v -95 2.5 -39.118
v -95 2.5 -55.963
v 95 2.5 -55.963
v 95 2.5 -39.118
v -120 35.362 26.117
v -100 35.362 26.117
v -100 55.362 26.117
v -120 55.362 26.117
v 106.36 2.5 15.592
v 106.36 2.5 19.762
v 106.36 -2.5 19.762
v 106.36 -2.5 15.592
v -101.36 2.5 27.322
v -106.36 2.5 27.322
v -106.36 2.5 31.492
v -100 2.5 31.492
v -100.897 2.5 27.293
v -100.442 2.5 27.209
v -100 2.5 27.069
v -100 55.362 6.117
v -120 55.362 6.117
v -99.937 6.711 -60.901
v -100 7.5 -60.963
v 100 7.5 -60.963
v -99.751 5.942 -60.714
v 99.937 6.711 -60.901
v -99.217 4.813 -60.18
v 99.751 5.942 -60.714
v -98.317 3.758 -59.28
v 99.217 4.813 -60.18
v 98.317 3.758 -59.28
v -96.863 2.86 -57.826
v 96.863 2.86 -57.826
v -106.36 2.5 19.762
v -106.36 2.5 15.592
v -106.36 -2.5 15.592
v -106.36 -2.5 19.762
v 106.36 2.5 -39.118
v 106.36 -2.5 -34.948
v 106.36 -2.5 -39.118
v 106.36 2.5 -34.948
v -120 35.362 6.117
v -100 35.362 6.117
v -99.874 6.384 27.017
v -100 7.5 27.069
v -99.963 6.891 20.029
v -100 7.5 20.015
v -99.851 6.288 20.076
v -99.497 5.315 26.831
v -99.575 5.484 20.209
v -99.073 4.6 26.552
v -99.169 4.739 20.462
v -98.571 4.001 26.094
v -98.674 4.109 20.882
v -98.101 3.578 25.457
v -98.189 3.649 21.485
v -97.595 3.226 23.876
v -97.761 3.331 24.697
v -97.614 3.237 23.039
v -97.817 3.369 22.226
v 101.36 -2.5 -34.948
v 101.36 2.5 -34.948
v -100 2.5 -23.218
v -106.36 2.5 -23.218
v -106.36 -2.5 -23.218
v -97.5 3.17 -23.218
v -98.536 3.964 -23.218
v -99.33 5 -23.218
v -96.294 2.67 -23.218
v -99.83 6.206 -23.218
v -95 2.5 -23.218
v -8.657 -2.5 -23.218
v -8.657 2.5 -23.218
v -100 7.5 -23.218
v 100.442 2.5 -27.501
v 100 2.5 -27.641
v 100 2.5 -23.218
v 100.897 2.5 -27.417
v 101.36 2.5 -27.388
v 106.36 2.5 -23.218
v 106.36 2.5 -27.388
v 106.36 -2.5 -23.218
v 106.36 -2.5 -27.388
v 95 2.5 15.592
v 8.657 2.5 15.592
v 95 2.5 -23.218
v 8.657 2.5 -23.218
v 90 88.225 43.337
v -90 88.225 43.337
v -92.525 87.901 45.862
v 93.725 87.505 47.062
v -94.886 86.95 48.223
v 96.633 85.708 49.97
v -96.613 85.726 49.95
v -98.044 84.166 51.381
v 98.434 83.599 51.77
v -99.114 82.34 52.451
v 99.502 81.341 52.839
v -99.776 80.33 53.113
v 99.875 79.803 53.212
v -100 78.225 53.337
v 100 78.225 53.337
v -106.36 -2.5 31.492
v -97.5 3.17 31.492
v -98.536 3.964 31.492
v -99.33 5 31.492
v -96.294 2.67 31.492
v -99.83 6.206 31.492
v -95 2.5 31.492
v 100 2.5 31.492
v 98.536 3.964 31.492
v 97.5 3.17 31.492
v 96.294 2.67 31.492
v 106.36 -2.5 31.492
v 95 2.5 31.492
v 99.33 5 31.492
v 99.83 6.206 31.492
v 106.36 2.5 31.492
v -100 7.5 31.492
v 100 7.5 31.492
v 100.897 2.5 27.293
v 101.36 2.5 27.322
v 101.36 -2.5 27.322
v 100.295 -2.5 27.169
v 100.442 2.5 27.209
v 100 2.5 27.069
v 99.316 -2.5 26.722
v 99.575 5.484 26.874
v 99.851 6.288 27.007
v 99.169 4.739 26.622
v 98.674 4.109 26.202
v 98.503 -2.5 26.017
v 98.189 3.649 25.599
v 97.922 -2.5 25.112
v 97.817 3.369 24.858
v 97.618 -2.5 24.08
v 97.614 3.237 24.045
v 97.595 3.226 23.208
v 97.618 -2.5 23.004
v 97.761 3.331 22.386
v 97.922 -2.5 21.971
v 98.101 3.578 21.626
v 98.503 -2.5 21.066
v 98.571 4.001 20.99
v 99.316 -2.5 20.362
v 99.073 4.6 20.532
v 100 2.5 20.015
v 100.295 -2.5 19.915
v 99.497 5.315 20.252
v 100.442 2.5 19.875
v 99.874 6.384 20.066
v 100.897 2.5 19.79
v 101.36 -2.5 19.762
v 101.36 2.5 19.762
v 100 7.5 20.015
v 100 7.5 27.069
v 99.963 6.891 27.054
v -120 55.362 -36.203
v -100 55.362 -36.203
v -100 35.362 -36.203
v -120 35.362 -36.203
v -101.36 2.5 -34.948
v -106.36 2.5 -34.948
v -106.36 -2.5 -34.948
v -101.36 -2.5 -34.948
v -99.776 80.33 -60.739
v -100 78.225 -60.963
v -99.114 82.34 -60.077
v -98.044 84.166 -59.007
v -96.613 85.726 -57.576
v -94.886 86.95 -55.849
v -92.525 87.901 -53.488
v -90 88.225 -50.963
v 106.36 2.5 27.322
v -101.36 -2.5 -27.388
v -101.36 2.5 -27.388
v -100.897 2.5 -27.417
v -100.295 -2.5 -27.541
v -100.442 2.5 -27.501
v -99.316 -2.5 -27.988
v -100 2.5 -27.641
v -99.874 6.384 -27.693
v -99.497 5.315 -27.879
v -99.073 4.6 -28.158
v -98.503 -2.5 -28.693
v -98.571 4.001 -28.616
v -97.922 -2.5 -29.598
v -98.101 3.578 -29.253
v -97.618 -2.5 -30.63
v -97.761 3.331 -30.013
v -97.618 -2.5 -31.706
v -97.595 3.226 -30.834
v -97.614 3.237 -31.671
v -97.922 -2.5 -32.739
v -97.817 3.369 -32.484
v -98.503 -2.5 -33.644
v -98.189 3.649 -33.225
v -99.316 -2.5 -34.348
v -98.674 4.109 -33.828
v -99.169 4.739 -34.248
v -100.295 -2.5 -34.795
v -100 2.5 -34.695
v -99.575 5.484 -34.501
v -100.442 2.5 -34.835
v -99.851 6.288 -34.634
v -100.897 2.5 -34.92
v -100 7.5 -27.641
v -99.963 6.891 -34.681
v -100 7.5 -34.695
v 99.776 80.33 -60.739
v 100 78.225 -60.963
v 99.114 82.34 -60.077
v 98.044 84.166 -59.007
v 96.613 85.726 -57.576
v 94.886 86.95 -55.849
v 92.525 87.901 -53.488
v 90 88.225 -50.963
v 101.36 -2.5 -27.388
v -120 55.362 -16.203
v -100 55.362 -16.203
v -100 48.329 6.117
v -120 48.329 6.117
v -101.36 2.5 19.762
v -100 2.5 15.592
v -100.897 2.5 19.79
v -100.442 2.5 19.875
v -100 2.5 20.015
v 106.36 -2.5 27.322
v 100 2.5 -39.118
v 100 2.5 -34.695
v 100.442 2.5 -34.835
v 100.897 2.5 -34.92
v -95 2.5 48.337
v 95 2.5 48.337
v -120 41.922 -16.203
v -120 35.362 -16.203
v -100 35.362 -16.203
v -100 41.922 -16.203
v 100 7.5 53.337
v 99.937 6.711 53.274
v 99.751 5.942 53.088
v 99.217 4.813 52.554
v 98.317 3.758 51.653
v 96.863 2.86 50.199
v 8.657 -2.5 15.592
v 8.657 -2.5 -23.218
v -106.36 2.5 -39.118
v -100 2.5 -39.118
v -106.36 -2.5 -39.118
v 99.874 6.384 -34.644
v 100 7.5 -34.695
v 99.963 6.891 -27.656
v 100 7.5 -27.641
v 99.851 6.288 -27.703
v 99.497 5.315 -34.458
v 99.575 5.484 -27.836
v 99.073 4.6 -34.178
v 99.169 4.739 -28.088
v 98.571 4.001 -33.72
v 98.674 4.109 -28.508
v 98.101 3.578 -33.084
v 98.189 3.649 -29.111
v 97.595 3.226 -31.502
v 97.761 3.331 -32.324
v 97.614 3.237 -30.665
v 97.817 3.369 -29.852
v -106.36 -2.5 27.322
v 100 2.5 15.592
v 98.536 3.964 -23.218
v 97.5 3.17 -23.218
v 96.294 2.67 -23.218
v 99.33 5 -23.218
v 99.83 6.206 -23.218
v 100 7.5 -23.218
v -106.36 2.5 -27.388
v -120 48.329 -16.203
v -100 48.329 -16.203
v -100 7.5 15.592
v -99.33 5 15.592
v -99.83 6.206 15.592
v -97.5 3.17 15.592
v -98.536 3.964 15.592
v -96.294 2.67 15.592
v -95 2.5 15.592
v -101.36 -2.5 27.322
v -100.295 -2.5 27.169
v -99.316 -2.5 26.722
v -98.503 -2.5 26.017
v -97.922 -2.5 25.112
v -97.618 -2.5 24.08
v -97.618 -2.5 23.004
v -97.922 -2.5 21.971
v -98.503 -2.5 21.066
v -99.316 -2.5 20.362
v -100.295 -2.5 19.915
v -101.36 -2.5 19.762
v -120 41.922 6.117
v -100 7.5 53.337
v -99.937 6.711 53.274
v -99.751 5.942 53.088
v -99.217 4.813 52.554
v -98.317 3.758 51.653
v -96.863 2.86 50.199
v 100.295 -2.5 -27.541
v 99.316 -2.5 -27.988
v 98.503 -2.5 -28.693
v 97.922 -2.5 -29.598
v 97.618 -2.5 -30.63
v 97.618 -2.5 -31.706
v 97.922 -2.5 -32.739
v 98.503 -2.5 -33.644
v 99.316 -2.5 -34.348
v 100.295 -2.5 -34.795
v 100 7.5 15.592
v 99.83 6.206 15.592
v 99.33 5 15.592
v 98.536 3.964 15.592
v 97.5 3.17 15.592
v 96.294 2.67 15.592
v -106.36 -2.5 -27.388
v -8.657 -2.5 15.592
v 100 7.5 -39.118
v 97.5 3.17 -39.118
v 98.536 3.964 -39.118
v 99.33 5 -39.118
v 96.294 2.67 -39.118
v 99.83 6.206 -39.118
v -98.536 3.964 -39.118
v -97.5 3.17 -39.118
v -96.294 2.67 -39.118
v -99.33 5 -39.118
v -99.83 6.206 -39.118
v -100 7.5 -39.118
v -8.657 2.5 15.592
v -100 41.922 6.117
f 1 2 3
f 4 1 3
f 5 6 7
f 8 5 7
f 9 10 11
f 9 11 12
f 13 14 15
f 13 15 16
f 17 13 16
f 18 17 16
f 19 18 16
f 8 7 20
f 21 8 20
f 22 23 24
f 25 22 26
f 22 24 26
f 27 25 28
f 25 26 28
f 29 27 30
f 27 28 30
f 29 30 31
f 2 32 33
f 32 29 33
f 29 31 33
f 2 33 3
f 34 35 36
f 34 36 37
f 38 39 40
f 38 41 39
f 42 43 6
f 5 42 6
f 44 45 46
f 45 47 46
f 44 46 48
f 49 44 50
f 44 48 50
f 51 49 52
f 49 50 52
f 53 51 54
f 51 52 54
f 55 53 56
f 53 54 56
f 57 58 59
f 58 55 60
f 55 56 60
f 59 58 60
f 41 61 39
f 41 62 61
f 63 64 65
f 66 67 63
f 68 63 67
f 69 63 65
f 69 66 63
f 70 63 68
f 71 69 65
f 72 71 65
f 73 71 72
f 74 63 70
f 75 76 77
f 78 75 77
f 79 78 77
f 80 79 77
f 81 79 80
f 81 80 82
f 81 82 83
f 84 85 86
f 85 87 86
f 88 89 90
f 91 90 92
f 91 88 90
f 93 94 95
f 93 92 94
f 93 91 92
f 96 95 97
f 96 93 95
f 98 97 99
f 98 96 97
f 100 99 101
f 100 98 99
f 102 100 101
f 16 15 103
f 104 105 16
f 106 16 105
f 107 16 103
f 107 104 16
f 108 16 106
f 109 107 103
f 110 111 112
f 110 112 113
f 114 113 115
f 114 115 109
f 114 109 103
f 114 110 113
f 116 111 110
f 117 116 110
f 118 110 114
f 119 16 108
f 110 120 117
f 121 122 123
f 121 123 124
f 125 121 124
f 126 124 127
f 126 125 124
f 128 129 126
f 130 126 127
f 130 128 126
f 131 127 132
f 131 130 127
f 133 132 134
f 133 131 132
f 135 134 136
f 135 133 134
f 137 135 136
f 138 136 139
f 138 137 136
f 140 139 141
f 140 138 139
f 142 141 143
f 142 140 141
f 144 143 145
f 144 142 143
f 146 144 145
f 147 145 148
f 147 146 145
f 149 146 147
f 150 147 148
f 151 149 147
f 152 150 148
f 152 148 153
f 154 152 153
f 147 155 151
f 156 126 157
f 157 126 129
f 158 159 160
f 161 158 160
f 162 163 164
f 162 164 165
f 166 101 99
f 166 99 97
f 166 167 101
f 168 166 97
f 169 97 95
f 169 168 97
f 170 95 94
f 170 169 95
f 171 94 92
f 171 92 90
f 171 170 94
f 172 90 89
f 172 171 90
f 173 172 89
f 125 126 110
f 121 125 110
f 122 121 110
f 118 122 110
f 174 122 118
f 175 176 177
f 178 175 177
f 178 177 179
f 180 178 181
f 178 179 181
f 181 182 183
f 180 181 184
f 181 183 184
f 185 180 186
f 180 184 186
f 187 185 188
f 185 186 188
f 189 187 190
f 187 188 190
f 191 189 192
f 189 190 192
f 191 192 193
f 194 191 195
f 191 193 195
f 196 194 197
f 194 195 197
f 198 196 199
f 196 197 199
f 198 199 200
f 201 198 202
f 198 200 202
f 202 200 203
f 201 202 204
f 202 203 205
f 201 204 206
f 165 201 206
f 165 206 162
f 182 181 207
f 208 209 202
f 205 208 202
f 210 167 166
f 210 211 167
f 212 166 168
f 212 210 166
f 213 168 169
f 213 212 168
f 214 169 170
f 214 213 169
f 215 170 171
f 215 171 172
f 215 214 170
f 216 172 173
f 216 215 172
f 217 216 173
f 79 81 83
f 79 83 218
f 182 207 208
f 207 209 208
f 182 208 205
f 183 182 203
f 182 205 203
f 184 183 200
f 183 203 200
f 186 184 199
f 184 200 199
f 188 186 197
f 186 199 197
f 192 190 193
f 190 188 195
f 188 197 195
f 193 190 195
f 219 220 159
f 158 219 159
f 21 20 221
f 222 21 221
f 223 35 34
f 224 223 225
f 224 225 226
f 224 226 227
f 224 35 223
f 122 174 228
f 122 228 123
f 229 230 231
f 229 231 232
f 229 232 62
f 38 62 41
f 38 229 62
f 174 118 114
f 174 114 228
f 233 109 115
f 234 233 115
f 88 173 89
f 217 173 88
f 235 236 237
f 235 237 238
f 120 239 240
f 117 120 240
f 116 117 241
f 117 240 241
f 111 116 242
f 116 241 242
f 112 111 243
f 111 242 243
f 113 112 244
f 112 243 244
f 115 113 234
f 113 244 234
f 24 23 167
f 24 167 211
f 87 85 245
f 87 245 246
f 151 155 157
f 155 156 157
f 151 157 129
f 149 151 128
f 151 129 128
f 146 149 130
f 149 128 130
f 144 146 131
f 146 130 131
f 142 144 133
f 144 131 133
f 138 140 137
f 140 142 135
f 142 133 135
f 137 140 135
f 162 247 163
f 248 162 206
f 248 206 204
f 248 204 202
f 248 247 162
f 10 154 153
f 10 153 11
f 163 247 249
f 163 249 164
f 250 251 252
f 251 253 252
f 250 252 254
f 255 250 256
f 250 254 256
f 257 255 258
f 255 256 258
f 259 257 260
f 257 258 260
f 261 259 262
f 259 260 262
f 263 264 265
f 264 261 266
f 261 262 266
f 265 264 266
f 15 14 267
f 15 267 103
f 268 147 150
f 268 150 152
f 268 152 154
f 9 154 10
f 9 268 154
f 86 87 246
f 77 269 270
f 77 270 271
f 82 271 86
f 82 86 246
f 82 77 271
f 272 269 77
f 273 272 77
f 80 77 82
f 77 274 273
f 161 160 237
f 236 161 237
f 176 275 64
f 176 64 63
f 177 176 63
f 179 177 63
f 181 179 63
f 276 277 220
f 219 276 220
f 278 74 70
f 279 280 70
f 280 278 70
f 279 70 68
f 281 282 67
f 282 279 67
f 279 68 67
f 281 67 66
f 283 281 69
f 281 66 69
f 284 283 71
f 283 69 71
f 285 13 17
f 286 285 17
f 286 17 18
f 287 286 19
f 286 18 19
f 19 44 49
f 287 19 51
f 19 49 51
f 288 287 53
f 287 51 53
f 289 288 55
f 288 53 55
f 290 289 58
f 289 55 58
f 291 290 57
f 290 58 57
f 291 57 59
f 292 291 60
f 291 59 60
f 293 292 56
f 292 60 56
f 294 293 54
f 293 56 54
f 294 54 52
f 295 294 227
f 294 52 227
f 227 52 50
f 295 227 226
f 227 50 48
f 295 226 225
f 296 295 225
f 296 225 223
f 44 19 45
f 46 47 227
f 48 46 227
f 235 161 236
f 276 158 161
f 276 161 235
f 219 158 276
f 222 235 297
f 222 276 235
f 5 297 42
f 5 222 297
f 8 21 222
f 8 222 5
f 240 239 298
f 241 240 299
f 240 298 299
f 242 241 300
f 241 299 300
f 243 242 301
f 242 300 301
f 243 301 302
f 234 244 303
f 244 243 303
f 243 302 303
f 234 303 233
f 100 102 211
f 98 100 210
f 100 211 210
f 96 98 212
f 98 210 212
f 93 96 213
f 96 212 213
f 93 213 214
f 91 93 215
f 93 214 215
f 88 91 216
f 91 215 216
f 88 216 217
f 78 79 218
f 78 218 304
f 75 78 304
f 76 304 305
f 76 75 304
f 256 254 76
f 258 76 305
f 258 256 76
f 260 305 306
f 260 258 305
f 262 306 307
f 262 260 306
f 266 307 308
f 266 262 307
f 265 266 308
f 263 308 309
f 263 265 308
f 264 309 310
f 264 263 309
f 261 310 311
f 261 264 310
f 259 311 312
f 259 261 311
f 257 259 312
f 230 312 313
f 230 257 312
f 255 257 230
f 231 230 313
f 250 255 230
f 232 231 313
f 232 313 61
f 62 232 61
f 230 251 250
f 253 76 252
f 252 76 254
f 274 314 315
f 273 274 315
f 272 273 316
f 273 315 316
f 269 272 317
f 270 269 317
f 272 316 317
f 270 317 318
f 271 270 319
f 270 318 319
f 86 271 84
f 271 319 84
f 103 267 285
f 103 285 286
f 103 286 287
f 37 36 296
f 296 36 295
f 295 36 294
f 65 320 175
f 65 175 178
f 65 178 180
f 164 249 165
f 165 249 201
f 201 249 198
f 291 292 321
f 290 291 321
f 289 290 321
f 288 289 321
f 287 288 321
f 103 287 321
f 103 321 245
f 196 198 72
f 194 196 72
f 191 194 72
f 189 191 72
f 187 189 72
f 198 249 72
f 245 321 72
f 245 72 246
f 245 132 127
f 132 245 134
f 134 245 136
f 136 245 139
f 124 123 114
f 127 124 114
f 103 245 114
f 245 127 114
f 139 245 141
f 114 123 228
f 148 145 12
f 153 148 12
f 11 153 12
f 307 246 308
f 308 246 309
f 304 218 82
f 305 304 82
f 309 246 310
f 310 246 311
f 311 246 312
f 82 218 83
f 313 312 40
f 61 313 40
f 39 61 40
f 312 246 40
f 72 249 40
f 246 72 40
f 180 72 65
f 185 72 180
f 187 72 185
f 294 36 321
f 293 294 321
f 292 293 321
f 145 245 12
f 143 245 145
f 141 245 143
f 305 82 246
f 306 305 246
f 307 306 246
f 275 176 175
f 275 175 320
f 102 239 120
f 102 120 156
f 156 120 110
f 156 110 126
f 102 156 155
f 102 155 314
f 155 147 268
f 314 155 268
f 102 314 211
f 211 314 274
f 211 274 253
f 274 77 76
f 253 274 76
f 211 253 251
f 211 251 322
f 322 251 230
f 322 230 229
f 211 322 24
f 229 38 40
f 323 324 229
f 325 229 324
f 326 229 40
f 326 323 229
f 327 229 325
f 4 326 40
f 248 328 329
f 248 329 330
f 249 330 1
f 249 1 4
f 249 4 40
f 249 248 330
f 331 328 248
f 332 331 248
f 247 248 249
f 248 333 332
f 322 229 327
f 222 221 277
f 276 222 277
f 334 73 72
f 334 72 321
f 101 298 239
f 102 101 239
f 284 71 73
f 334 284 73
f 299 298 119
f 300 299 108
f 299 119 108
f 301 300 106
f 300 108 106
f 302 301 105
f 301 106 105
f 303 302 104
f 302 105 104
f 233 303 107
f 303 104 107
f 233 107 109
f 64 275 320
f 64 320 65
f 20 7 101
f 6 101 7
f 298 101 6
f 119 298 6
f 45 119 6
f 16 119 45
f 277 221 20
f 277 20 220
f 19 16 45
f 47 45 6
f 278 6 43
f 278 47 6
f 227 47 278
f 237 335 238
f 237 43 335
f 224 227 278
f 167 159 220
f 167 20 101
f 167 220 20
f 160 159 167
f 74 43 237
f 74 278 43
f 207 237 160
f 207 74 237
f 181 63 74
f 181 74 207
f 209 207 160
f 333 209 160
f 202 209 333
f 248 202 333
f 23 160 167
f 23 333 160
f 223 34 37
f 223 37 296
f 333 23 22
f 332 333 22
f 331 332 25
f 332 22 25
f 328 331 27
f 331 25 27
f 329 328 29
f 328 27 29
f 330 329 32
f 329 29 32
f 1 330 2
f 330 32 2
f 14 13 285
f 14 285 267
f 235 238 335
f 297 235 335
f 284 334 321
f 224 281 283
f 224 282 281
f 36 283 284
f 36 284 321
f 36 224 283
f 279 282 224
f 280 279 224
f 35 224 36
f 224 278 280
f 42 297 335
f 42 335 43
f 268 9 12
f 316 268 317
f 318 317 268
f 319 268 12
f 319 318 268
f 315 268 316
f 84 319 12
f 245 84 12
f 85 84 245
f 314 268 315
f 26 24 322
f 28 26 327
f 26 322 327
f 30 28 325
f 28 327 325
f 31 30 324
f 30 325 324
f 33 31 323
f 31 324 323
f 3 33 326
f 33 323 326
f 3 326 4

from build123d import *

# Parameters (mm, degrees)
BOSS_EXTRUDE1_DEPTH = 2.5
SKETCH2_W           = 200
SKETCH2_H           = 114.3
BOSS_EXTRUDE3_DEPTH = 85.725
BOSS_EXTRUDE5_DEPTH = 20
FILLET1_R           = 5
FILLET2_R           = 10


with BuildPart() as part:
    # Sketch1 → Boss-Extrude1 (new, symmetric)
    with BuildSketch(Plane(origin=(0, 0, 0), x_dir=(1, 0, 0), z_dir=(0, 1, 0))):
        with BuildLine():
            Line((106.36, 39.118252024), (-106.36, 39.118252024))
            Line((-106.36, 39.118252024), (-106.36, 34.948252024))
            Line((-106.36, 34.948252024), (-101.36, 34.948252024))
            ThreePointArc((-101.36, 34.948252024), (-97.58, 31.168252024), (-101.36, 27.388252024))
            Line((-101.36, 27.388252024), (-106.36, 27.388252024))
            Line((-106.36, 27.388252024), (-106.36, 23.218252024))
            Line((-106.36, 23.218252024), (-8.657269076, 23.218252024))
            Line((-8.657269076, 23.218252024), (-8.657269076, -15.591747976))
            Line((-8.657269076, -15.591747976), (-106.36, -15.591747976))
            Line((-106.36, -15.591747976), (-106.36, -19.761747976))
            Line((-106.36, -19.761747976), (-101.36, -19.761747976))
            ThreePointArc((-101.36, -19.761747976), (-97.58, -23.541747976), (-101.36, -27.321747976))
            Line((-101.36, -27.321747976), (-106.36, -27.321747976))
            Line((-106.36, -27.321747976), (-106.36, -31.491747976))
            Line((-106.36, -31.491747976), (106.36, -31.491747976))
            Line((106.36, -31.491747976), (106.36, -27.321747976))
            Line((106.36, -27.321747976), (101.36, -27.321747976))
            ThreePointArc((101.36, -27.321747976), (97.58, -23.541747976), (101.36, -19.761747976))
            Line((101.36, -19.761747976), (106.36, -19.761747976))
            Line((106.36, -19.761747976), (106.36, -15.591747976))
            Line((106.36, -15.591747976), (8.657269076, -15.591747976))
            Line((8.657269076, -15.591747976), (8.657269076, 23.218252024))
            Line((8.657269076, 23.218252024), (106.36, 23.218252024))
            Line((106.36, 23.218252024), (106.36, 27.388252024))
            Line((106.36, 27.388252024), (101.36, 27.388252024))
            ThreePointArc((101.36, 27.388252024), (97.58, 31.168252024), (101.36, 34.948252024))
            Line((101.36, 34.948252024), (106.36, 34.948252024))
            Line((106.36, 34.948252024), (106.36, 39.118252024))
        make_face()
    extrude(amount=BOSS_EXTRUDE1_DEPTH, both=True)

    # Sketch2 → Boss-Extrude3 (add)
    with BuildSketch(Plane(origin=(0, 2.5, 0), x_dir=(1, 0, 0), z_dir=(0, 1, 0))):
        with Locations((0, 3.813252024)):
            Rectangle(SKETCH2_W, SKETCH2_H)
    extrude(amount=BOSS_EXTRUDE3_DEPTH)

    # Sketch3 → Boss-Extrude5 (add)
    with BuildSketch(Plane.ZY.offset(100)):
        Polygon((-16.203252024, 41.921564451), (6.116747976, 41.921564451), (6.116747976, 35.3625), (26.116747976, 35.3625), (26.116747976, 55.3625), (6.116747976, 55.3625), (6.116747976, 48.328638309), (-16.203252024, 48.328638309), (-16.203252024, 55.3625), (-36.203252024, 55.3625), (-36.203252024, 35.3625), (-16.203252024, 35.3625), align=None)
    extrude(amount=BOSS_EXTRUDE5_DEPTH)

    # Fillet1
    # the kernel refuses this fillet: 5 mm, written as the material it takes off along each edge
    with BuildSketch(Plane(origin=(-100, 2.5, 7.514879677), x_dir=(0, 1, 0), z_dir=(0, 0, 1))) as fillet1_piece_1_section:
        with BuildLine():
            CenterArc((FILLET1_R, -FILLET1_R), FILLET1_R, 90, 90)
            Line((0, -FILLET1_R), (0, 0))
            Line((0, 0), (FILLET1_R, 0))
        make_face()
    fillet1_piece_1 = extrude(amount=32.053736598, mode=Mode.PRIVATE)
    fillet1_piece_1 = split(fillet1_piece_1, bisect_by=Plane(origin=(-98.883160305, 3.616839695, 15.591747976), z_dir=(0, 0, -1)), keep=Keep.TOP, mode=Mode.PRIVATE)
    add(fillet1_piece_1, mode=Mode.SUBTRACT)
    with BuildSketch(Plane(origin=(-100, 2.5, 7.514879677), x_dir=(0, 1, 0), z_dir=(0, 0, 1))) as fillet1_piece_2_section:
        with BuildLine():
            CenterArc((FILLET1_R, -FILLET1_R), FILLET1_R, 90, 90)
            Line((0, -FILLET1_R), (0, 0))
            Line((0, 0), (FILLET1_R, 0))
        make_face()
    fillet1_piece_2 = extrude(amount=32.053736598, mode=Mode.PRIVATE)
    fillet1_piece_2 = split(fillet1_piece_2, bisect_by=Plane(origin=(-98.883160305, 3.616839695, 31.491747976), z_dir=(0, 0, 1)), keep=Keep.TOP, mode=Mode.PRIVATE)
    add(fillet1_piece_2, mode=Mode.SUBTRACT)
    with BuildSketch(Plane(origin=(-100, 2.5, 7.514879677), x_dir=(0, 1, 0), z_dir=(0, 0, 1))) as fillet1_piece_3_section:
        with BuildLine():
            CenterArc((FILLET1_R, -FILLET1_R), FILLET1_R, 90, 90)
            Line((0, -FILLET1_R), (0, 0))
            Line((0, 0), (FILLET1_R, 0))
        make_face()
    fillet1_piece_3 = extrude(amount=32.053736598, mode=Mode.PRIVATE)
    fillet1_piece_3 = fillet1_piece_3 & Plane(origin=(-101.36, 3.831804997, 23.541747976), x_dir=(0, 0, -1), z_dir=(0, 1, 0)) * Cylinder(3.78, 85, mode=Mode.PRIVATE)
    add(fillet1_piece_3, mode=Mode.SUBTRACT)
    with BuildSketch(Plane(origin=(-100, 2.5, 31.491747976), x_dir=(0, 1, 0), z_dir=(0, 0, 1)), Plane(origin=(100, 2.5, 65.836747976), x_dir=(0, 1, 0), z_dir=(0, 0, -1))) as fillet1_piece_4:
        with BuildLine():
            CenterArc((FILLET1_R, -FILLET1_R), FILLET1_R, 90, 90)
            Line((0, -FILLET1_R), (0, 0))
            Line((0, 0), (FILLET1_R, 0))
        make_face()
    extrude(amount=34.345, mode=Mode.SUBTRACT)
    with BuildSketch(Plane(origin=(-100, 2.5, 18.991747976), x_dir=(0, 1, 0), z_dir=(0, 0, 1))) as fillet1_piece_5_section:
        with BuildLine():
            CenterArc((FILLET1_R, -FILLET1_R), FILLET1_R, 90, 90)
            Line((0, -FILLET1_R), (0, 0))
            Line((0, 0), (FILLET1_R, 0))
        make_face()
    fillet1_piece_5 = extrude(amount=46.845, mode=Mode.PRIVATE)
    fillet1_piece_5 = fillet1_piece_5 & Plane(origin=(-101.36, 3.831804998, 23.541747976), x_dir=(0, 0, -1), z_dir=(0, 1, 0)) * Cylinder(3.78, 114, mode=Mode.PRIVATE)
    add(fillet1_piece_5, mode=Mode.SUBTRACT)
    with BuildSketch(Plane(origin=(-100, 2.5, -73.463252024), x_dir=(1, 0, 0), z_dir=(0, 0, 1)), Plane(origin=(100, 2.5, -39.118252024), x_dir=(-1, 0, 0), z_dir=(0, 0, -1))) as fillet1_piece_6:
        with BuildLine():
            CenterArc((FILLET1_R, FILLET1_R), FILLET1_R, 180, 90)
            Line((0, FILLET1_R), (0, 0))
            Line((0, 0), (FILLET1_R, 0))
        make_face()
    extrude(amount=34.345, mode=Mode.SUBTRACT)
    with BuildSketch(Plane(origin=(-100, 2.5, -73.463252024), x_dir=(1, 0, 0), z_dir=(0, 0, 1))) as fillet1_piece_7_section:
        with BuildLine():
            CenterArc((FILLET1_R, FILLET1_R), FILLET1_R, 180, 90)
            Line((0, FILLET1_R), (0, 0))
            Line((0, 0), (FILLET1_R, 0))
        make_face()
    fillet1_piece_7 = extrude(amount=46.845, mode=Mode.PRIVATE)
    fillet1_piece_7 = fillet1_piece_7 & Plane(origin=(-101.36, 3.831808232, -31.168252024), x_dir=(0, 0, -1), z_dir=(0, 1, 0)) * Cylinder(3.78, 114, mode=Mode.PRIVATE)
    add(fillet1_piece_7, mode=Mode.SUBTRACT)
    with BuildSketch(Plane(origin=(112.5, 2.5, -60.963252024), x_dir=(0, 0, 1), z_dir=(-1, 0, 0)), Plane(origin=(-112.5, 2.5, 53.336747976), x_dir=(0, 0, -1), z_dir=(1, 0, 0))) as fillet1_piece_8:
        with BuildLine():
            CenterArc((FILLET1_R, FILLET1_R), FILLET1_R, 180, 90)
            Line((0, FILLET1_R), (0, 0))
            Line((0, 0), (FILLET1_R, 0))
        make_face()
    extrude(amount=225, mode=Mode.SUBTRACT)
    with BuildSketch(Plane(origin=(-100, 2.5, -47.195120323), x_dir=(0, 1, 0), z_dir=(0, 0, 1))) as fillet1_piece_9_section:
        with BuildLine():
            CenterArc((FILLET1_R, -FILLET1_R), FILLET1_R, 90, 90)
            Line((0, -FILLET1_R), (0, 0))
            Line((0, 0), (FILLET1_R, 0))
        make_face()
    fillet1_piece_9 = extrude(amount=32.053736598, mode=Mode.PRIVATE)
    fillet1_piece_9 = split(fillet1_piece_9, bisect_by=Plane(origin=(-98.883160305, 3.616839695, -39.118252024), z_dir=(0, 0, -1)), keep=Keep.TOP, mode=Mode.PRIVATE)
    add(fillet1_piece_9, mode=Mode.SUBTRACT)
    with BuildSketch(Plane(origin=(-100, 2.5, -47.195120323), x_dir=(0, 1, 0), z_dir=(0, 0, 1))) as fillet1_piece_10_section:
        with BuildLine():
            CenterArc((FILLET1_R, -FILLET1_R), FILLET1_R, 90, 90)
            Line((0, -FILLET1_R), (0, 0))
            Line((0, 0), (FILLET1_R, 0))
        make_face()
    fillet1_piece_10 = extrude(amount=32.053736598, mode=Mode.PRIVATE)
    fillet1_piece_10 = split(fillet1_piece_10, bisect_by=Plane(origin=(-98.883160305, 3.616839695, -23.218252024), z_dir=(0, 0, 1)), keep=Keep.TOP, mode=Mode.PRIVATE)
    add(fillet1_piece_10, mode=Mode.SUBTRACT)
    with BuildSketch(Plane(origin=(-100, 2.5, -47.195120323), x_dir=(0, 1, 0), z_dir=(0, 0, 1))) as fillet1_piece_11_section:
        with BuildLine():
            CenterArc((FILLET1_R, -FILLET1_R), FILLET1_R, 90, 90)
            Line((0, -FILLET1_R), (0, 0))
            Line((0, 0), (FILLET1_R, 0))
        make_face()
    fillet1_piece_11 = extrude(amount=32.053736598, mode=Mode.PRIVATE)
    fillet1_piece_11 = fillet1_piece_11 & Plane(origin=(-101.36, 3.831804998, -31.168252024), x_dir=(0, 0, -1), z_dir=(0, 1, 0)) * Cylinder(3.78, 85, mode=Mode.PRIVATE)
    add(fillet1_piece_11, mode=Mode.SUBTRACT)
    with BuildSketch(Plane(origin=(-100, 2.5, -23.218252024), x_dir=(0, 1, 0), z_dir=(0, 0, 1)), Plane(origin=(100, 2.5, 15.591747976), x_dir=(0, 1, 0), z_dir=(0, 0, -1))) as fillet1_piece_12:
        with BuildLine():
            CenterArc((FILLET1_R, -FILLET1_R), FILLET1_R, 90, 90)
            Line((0, -FILLET1_R), (0, 0))
            Line((0, 0), (FILLET1_R, 0))
        make_face()
    extrude(amount=38.81, mode=Mode.SUBTRACT)
    with BuildSketch(Plane(origin=(-100, 2.5, -35.718252024), x_dir=(0, 1, 0), z_dir=(0, 0, 1))) as fillet1_piece_13_section:
        with BuildLine():
            CenterArc((FILLET1_R, -FILLET1_R), FILLET1_R, 90, 90)
            Line((0, -FILLET1_R), (0, 0))
            Line((0, 0), (FILLET1_R, 0))
        make_face()
    fillet1_piece_13 = extrude(amount=63.81, mode=Mode.PRIVATE)
    fillet1_piece_13 = fillet1_piece_13 & Plane(origin=(-101.36, 3.831804998, -31.168252024), x_dir=(0, 0, -1), z_dir=(0, 1, 0)) * Cylinder(3.78, 148, mode=Mode.PRIVATE)
    add(fillet1_piece_13, mode=Mode.SUBTRACT)
    with BuildSketch(Plane(origin=(-100, 2.5, -35.718252024), x_dir=(0, 1, 0), z_dir=(0, 0, 1))) as fillet1_piece_14_section:
        with BuildLine():
            CenterArc((FILLET1_R, -FILLET1_R), FILLET1_R, 90, 90)
            Line((0, -FILLET1_R), (0, 0))
            Line((0, 0), (FILLET1_R, 0))
        make_face()
    fillet1_piece_14 = extrude(amount=63.81, mode=Mode.PRIVATE)
    fillet1_piece_14 = fillet1_piece_14 & Plane(origin=(-101.36, 3.831804998, 23.541747976), x_dir=(0, 0, -1), z_dir=(0, 1, 0)) * Cylinder(3.78, 148, mode=Mode.PRIVATE)
    add(fillet1_piece_14, mode=Mode.SUBTRACT)
    with BuildSketch(Plane(origin=(100, 2.5, 65.836747976), x_dir=(0, 1, 0), z_dir=(0, 0, -1))) as fillet1_piece_15_section:
        with BuildLine():
            CenterArc((FILLET1_R, -FILLET1_R), FILLET1_R, 90, 90)
            Line((0, -FILLET1_R), (0, 0))
            Line((0, 0), (FILLET1_R, 0))
        make_face()
    fillet1_piece_15 = extrude(amount=46.845, mode=Mode.PRIVATE)
    fillet1_piece_15 = fillet1_piece_15 & Plane(origin=(101.36, 3.831804997, 23.541747976), x_dir=(0, 0, 1), z_dir=(0, 1, 0)) * Cylinder(3.78, 114, mode=Mode.PRIVATE)
    add(fillet1_piece_15, mode=Mode.SUBTRACT)
    with BuildSketch(Plane(origin=(100, 2.5, 39.568616275), x_dir=(0, 1, 0), z_dir=(0, 0, -1))) as fillet1_piece_16_section:
        with BuildLine():
            CenterArc((FILLET1_R, -FILLET1_R), FILLET1_R, 90, 90)
            Line((0, -FILLET1_R), (0, 0))
            Line((0, 0), (FILLET1_R, 0))
        make_face()
    fillet1_piece_16 = extrude(amount=32.053736598, mode=Mode.PRIVATE)
    fillet1_piece_16 = split(fillet1_piece_16, bisect_by=Plane(origin=(98.883160305, 3.616839695, 31.491747976), z_dir=(0, 0, 1)), keep=Keep.TOP, mode=Mode.PRIVATE)
    add(fillet1_piece_16, mode=Mode.SUBTRACT)
    with BuildSketch(Plane(origin=(100, 2.5, 39.568616275), x_dir=(0, 1, 0), z_dir=(0, 0, -1))) as fillet1_piece_17_section:
        with BuildLine():
            CenterArc((FILLET1_R, -FILLET1_R), FILLET1_R, 90, 90)
            Line((0, -FILLET1_R), (0, 0))
            Line((0, 0), (FILLET1_R, 0))
        make_face()
    fillet1_piece_17 = extrude(amount=32.053736598, mode=Mode.PRIVATE)
    fillet1_piece_17 = split(fillet1_piece_17, bisect_by=Plane(origin=(98.883160305, 3.616839695, 15.591747976), z_dir=(0, 0, -1)), keep=Keep.TOP, mode=Mode.PRIVATE)
    add(fillet1_piece_17, mode=Mode.SUBTRACT)
    with BuildSketch(Plane(origin=(100, 2.5, 39.568616275), x_dir=(0, 1, 0), z_dir=(0, 0, -1))) as fillet1_piece_18_section:
        with BuildLine():
            CenterArc((FILLET1_R, -FILLET1_R), FILLET1_R, 90, 90)
            Line((0, -FILLET1_R), (0, 0))
            Line((0, 0), (FILLET1_R, 0))
        make_face()
    fillet1_piece_18 = extrude(amount=32.053736598, mode=Mode.PRIVATE)
    fillet1_piece_18 = fillet1_piece_18 & Plane(origin=(101.36, 3.831804998, 23.541747976), x_dir=(0, 0, 1), z_dir=(0, 1, 0)) * Cylinder(3.78, 85, mode=Mode.PRIVATE)
    add(fillet1_piece_18, mode=Mode.SUBTRACT)
    with BuildSketch(Plane(origin=(100, 2.5, 28.091747976), x_dir=(0, 1, 0), z_dir=(0, 0, -1))) as fillet1_piece_19_section:
        with BuildLine():
            CenterArc((FILLET1_R, -FILLET1_R), FILLET1_R, 90, 90)
            Line((0, -FILLET1_R), (0, 0))
            Line((0, 0), (FILLET1_R, 0))
        make_face()
    fillet1_piece_19 = extrude(amount=63.81, mode=Mode.PRIVATE)
    fillet1_piece_19 = fillet1_piece_19 & Plane(origin=(101.36, 3.831804998, 23.541747976), x_dir=(0, 0, 1), z_dir=(0, 1, 0)) * Cylinder(3.78, 148, mode=Mode.PRIVATE)
    add(fillet1_piece_19, mode=Mode.SUBTRACT)
    with BuildSketch(Plane(origin=(100, 2.5, 28.091747976), x_dir=(0, 1, 0), z_dir=(0, 0, -1))) as fillet1_piece_20_section:
        with BuildLine():
            CenterArc((FILLET1_R, -FILLET1_R), FILLET1_R, 90, 90)
            Line((0, -FILLET1_R), (0, 0))
            Line((0, 0), (FILLET1_R, 0))
        make_face()
    fillet1_piece_20 = extrude(amount=63.81, mode=Mode.PRIVATE)
    fillet1_piece_20 = fillet1_piece_20 & Plane(origin=(101.36, 3.831804999, -31.168252024), x_dir=(0, 0, 1), z_dir=(0, 1, 0)) * Cylinder(3.78, 148, mode=Mode.PRIVATE)
    add(fillet1_piece_20, mode=Mode.SUBTRACT)
    with BuildSketch(Plane(origin=(100, 2.5, -15.141383725), x_dir=(0, 1, 0), z_dir=(0, 0, -1))) as fillet1_piece_21_section:
        with BuildLine():
            CenterArc((FILLET1_R, -FILLET1_R), FILLET1_R, 90, 90)
            Line((0, -FILLET1_R), (0, 0))
            Line((0, 0), (FILLET1_R, 0))
        make_face()
    fillet1_piece_21 = extrude(amount=32.053736598, mode=Mode.PRIVATE)
    fillet1_piece_21 = split(fillet1_piece_21, bisect_by=Plane(origin=(98.883160305, 3.616839695, -23.218252024), z_dir=(0, 0, 1)), keep=Keep.TOP, mode=Mode.PRIVATE)
    add(fillet1_piece_21, mode=Mode.SUBTRACT)
    with BuildSketch(Plane(origin=(100, 2.5, -15.141383725), x_dir=(0, 1, 0), z_dir=(0, 0, -1))) as fillet1_piece_22_section:
        with BuildLine():
            CenterArc((FILLET1_R, -FILLET1_R), FILLET1_R, 90, 90)
            Line((0, -FILLET1_R), (0, 0))
            Line((0, 0), (FILLET1_R, 0))
        make_face()
    fillet1_piece_22 = extrude(amount=32.053736598, mode=Mode.PRIVATE)
    fillet1_piece_22 = split(fillet1_piece_22, bisect_by=Plane(origin=(98.883160305, 3.616839695, -39.118252024), z_dir=(0, 0, -1)), keep=Keep.TOP, mode=Mode.PRIVATE)
    add(fillet1_piece_22, mode=Mode.SUBTRACT)
    with BuildSketch(Plane(origin=(100, 2.5, -15.141383725), x_dir=(0, 1, 0), z_dir=(0, 0, -1))) as fillet1_piece_23_section:
        with BuildLine():
            CenterArc((FILLET1_R, -FILLET1_R), FILLET1_R, 90, 90)
            Line((0, -FILLET1_R), (0, 0))
            Line((0, 0), (FILLET1_R, 0))
        make_face()
    fillet1_piece_23 = extrude(amount=32.053736598, mode=Mode.PRIVATE)
    fillet1_piece_23 = fillet1_piece_23 & Plane(origin=(101.36, 3.831804997, -31.168252024), x_dir=(0, 0, 1), z_dir=(0, 1, 0)) * Cylinder(3.78, 85, mode=Mode.PRIVATE)
    add(fillet1_piece_23, mode=Mode.SUBTRACT)
    with BuildSketch(Plane(origin=(100, 2.5, -26.618252024), x_dir=(-1, 0, 0), z_dir=(0, 0, -1))) as fillet1_piece_24_section:
        with BuildLine():
            CenterArc((FILLET1_R, FILLET1_R), FILLET1_R, 180, 90)
            Line((0, FILLET1_R), (0, 0))
            Line((0, 0), (FILLET1_R, 0))
        make_face()
    fillet1_piece_24 = extrude(amount=46.845, mode=Mode.PRIVATE)
    fillet1_piece_24 = fillet1_piece_24 & Plane(origin=(101.36, 3.831808232, -31.168252024), x_dir=(0, 0, 1), z_dir=(0, 1, 0)) * Cylinder(3.78, 114, mode=Mode.PRIVATE)
    add(fillet1_piece_24, mode=Mode.SUBTRACT)

    # Fillet2
    fillet2_edges = [part.edges().sort_by_distance(p)[0] for p in [
        (0, 88.225, -60.963252024),
        (-100, 88.225, -3.813252024),
        (0, 88.225, 53.336747976),
        (100, 88.225, -3.813252024),
    ]]
    fillet(fillet2_edges, radius=FILLET2_R)


solid = part.part
